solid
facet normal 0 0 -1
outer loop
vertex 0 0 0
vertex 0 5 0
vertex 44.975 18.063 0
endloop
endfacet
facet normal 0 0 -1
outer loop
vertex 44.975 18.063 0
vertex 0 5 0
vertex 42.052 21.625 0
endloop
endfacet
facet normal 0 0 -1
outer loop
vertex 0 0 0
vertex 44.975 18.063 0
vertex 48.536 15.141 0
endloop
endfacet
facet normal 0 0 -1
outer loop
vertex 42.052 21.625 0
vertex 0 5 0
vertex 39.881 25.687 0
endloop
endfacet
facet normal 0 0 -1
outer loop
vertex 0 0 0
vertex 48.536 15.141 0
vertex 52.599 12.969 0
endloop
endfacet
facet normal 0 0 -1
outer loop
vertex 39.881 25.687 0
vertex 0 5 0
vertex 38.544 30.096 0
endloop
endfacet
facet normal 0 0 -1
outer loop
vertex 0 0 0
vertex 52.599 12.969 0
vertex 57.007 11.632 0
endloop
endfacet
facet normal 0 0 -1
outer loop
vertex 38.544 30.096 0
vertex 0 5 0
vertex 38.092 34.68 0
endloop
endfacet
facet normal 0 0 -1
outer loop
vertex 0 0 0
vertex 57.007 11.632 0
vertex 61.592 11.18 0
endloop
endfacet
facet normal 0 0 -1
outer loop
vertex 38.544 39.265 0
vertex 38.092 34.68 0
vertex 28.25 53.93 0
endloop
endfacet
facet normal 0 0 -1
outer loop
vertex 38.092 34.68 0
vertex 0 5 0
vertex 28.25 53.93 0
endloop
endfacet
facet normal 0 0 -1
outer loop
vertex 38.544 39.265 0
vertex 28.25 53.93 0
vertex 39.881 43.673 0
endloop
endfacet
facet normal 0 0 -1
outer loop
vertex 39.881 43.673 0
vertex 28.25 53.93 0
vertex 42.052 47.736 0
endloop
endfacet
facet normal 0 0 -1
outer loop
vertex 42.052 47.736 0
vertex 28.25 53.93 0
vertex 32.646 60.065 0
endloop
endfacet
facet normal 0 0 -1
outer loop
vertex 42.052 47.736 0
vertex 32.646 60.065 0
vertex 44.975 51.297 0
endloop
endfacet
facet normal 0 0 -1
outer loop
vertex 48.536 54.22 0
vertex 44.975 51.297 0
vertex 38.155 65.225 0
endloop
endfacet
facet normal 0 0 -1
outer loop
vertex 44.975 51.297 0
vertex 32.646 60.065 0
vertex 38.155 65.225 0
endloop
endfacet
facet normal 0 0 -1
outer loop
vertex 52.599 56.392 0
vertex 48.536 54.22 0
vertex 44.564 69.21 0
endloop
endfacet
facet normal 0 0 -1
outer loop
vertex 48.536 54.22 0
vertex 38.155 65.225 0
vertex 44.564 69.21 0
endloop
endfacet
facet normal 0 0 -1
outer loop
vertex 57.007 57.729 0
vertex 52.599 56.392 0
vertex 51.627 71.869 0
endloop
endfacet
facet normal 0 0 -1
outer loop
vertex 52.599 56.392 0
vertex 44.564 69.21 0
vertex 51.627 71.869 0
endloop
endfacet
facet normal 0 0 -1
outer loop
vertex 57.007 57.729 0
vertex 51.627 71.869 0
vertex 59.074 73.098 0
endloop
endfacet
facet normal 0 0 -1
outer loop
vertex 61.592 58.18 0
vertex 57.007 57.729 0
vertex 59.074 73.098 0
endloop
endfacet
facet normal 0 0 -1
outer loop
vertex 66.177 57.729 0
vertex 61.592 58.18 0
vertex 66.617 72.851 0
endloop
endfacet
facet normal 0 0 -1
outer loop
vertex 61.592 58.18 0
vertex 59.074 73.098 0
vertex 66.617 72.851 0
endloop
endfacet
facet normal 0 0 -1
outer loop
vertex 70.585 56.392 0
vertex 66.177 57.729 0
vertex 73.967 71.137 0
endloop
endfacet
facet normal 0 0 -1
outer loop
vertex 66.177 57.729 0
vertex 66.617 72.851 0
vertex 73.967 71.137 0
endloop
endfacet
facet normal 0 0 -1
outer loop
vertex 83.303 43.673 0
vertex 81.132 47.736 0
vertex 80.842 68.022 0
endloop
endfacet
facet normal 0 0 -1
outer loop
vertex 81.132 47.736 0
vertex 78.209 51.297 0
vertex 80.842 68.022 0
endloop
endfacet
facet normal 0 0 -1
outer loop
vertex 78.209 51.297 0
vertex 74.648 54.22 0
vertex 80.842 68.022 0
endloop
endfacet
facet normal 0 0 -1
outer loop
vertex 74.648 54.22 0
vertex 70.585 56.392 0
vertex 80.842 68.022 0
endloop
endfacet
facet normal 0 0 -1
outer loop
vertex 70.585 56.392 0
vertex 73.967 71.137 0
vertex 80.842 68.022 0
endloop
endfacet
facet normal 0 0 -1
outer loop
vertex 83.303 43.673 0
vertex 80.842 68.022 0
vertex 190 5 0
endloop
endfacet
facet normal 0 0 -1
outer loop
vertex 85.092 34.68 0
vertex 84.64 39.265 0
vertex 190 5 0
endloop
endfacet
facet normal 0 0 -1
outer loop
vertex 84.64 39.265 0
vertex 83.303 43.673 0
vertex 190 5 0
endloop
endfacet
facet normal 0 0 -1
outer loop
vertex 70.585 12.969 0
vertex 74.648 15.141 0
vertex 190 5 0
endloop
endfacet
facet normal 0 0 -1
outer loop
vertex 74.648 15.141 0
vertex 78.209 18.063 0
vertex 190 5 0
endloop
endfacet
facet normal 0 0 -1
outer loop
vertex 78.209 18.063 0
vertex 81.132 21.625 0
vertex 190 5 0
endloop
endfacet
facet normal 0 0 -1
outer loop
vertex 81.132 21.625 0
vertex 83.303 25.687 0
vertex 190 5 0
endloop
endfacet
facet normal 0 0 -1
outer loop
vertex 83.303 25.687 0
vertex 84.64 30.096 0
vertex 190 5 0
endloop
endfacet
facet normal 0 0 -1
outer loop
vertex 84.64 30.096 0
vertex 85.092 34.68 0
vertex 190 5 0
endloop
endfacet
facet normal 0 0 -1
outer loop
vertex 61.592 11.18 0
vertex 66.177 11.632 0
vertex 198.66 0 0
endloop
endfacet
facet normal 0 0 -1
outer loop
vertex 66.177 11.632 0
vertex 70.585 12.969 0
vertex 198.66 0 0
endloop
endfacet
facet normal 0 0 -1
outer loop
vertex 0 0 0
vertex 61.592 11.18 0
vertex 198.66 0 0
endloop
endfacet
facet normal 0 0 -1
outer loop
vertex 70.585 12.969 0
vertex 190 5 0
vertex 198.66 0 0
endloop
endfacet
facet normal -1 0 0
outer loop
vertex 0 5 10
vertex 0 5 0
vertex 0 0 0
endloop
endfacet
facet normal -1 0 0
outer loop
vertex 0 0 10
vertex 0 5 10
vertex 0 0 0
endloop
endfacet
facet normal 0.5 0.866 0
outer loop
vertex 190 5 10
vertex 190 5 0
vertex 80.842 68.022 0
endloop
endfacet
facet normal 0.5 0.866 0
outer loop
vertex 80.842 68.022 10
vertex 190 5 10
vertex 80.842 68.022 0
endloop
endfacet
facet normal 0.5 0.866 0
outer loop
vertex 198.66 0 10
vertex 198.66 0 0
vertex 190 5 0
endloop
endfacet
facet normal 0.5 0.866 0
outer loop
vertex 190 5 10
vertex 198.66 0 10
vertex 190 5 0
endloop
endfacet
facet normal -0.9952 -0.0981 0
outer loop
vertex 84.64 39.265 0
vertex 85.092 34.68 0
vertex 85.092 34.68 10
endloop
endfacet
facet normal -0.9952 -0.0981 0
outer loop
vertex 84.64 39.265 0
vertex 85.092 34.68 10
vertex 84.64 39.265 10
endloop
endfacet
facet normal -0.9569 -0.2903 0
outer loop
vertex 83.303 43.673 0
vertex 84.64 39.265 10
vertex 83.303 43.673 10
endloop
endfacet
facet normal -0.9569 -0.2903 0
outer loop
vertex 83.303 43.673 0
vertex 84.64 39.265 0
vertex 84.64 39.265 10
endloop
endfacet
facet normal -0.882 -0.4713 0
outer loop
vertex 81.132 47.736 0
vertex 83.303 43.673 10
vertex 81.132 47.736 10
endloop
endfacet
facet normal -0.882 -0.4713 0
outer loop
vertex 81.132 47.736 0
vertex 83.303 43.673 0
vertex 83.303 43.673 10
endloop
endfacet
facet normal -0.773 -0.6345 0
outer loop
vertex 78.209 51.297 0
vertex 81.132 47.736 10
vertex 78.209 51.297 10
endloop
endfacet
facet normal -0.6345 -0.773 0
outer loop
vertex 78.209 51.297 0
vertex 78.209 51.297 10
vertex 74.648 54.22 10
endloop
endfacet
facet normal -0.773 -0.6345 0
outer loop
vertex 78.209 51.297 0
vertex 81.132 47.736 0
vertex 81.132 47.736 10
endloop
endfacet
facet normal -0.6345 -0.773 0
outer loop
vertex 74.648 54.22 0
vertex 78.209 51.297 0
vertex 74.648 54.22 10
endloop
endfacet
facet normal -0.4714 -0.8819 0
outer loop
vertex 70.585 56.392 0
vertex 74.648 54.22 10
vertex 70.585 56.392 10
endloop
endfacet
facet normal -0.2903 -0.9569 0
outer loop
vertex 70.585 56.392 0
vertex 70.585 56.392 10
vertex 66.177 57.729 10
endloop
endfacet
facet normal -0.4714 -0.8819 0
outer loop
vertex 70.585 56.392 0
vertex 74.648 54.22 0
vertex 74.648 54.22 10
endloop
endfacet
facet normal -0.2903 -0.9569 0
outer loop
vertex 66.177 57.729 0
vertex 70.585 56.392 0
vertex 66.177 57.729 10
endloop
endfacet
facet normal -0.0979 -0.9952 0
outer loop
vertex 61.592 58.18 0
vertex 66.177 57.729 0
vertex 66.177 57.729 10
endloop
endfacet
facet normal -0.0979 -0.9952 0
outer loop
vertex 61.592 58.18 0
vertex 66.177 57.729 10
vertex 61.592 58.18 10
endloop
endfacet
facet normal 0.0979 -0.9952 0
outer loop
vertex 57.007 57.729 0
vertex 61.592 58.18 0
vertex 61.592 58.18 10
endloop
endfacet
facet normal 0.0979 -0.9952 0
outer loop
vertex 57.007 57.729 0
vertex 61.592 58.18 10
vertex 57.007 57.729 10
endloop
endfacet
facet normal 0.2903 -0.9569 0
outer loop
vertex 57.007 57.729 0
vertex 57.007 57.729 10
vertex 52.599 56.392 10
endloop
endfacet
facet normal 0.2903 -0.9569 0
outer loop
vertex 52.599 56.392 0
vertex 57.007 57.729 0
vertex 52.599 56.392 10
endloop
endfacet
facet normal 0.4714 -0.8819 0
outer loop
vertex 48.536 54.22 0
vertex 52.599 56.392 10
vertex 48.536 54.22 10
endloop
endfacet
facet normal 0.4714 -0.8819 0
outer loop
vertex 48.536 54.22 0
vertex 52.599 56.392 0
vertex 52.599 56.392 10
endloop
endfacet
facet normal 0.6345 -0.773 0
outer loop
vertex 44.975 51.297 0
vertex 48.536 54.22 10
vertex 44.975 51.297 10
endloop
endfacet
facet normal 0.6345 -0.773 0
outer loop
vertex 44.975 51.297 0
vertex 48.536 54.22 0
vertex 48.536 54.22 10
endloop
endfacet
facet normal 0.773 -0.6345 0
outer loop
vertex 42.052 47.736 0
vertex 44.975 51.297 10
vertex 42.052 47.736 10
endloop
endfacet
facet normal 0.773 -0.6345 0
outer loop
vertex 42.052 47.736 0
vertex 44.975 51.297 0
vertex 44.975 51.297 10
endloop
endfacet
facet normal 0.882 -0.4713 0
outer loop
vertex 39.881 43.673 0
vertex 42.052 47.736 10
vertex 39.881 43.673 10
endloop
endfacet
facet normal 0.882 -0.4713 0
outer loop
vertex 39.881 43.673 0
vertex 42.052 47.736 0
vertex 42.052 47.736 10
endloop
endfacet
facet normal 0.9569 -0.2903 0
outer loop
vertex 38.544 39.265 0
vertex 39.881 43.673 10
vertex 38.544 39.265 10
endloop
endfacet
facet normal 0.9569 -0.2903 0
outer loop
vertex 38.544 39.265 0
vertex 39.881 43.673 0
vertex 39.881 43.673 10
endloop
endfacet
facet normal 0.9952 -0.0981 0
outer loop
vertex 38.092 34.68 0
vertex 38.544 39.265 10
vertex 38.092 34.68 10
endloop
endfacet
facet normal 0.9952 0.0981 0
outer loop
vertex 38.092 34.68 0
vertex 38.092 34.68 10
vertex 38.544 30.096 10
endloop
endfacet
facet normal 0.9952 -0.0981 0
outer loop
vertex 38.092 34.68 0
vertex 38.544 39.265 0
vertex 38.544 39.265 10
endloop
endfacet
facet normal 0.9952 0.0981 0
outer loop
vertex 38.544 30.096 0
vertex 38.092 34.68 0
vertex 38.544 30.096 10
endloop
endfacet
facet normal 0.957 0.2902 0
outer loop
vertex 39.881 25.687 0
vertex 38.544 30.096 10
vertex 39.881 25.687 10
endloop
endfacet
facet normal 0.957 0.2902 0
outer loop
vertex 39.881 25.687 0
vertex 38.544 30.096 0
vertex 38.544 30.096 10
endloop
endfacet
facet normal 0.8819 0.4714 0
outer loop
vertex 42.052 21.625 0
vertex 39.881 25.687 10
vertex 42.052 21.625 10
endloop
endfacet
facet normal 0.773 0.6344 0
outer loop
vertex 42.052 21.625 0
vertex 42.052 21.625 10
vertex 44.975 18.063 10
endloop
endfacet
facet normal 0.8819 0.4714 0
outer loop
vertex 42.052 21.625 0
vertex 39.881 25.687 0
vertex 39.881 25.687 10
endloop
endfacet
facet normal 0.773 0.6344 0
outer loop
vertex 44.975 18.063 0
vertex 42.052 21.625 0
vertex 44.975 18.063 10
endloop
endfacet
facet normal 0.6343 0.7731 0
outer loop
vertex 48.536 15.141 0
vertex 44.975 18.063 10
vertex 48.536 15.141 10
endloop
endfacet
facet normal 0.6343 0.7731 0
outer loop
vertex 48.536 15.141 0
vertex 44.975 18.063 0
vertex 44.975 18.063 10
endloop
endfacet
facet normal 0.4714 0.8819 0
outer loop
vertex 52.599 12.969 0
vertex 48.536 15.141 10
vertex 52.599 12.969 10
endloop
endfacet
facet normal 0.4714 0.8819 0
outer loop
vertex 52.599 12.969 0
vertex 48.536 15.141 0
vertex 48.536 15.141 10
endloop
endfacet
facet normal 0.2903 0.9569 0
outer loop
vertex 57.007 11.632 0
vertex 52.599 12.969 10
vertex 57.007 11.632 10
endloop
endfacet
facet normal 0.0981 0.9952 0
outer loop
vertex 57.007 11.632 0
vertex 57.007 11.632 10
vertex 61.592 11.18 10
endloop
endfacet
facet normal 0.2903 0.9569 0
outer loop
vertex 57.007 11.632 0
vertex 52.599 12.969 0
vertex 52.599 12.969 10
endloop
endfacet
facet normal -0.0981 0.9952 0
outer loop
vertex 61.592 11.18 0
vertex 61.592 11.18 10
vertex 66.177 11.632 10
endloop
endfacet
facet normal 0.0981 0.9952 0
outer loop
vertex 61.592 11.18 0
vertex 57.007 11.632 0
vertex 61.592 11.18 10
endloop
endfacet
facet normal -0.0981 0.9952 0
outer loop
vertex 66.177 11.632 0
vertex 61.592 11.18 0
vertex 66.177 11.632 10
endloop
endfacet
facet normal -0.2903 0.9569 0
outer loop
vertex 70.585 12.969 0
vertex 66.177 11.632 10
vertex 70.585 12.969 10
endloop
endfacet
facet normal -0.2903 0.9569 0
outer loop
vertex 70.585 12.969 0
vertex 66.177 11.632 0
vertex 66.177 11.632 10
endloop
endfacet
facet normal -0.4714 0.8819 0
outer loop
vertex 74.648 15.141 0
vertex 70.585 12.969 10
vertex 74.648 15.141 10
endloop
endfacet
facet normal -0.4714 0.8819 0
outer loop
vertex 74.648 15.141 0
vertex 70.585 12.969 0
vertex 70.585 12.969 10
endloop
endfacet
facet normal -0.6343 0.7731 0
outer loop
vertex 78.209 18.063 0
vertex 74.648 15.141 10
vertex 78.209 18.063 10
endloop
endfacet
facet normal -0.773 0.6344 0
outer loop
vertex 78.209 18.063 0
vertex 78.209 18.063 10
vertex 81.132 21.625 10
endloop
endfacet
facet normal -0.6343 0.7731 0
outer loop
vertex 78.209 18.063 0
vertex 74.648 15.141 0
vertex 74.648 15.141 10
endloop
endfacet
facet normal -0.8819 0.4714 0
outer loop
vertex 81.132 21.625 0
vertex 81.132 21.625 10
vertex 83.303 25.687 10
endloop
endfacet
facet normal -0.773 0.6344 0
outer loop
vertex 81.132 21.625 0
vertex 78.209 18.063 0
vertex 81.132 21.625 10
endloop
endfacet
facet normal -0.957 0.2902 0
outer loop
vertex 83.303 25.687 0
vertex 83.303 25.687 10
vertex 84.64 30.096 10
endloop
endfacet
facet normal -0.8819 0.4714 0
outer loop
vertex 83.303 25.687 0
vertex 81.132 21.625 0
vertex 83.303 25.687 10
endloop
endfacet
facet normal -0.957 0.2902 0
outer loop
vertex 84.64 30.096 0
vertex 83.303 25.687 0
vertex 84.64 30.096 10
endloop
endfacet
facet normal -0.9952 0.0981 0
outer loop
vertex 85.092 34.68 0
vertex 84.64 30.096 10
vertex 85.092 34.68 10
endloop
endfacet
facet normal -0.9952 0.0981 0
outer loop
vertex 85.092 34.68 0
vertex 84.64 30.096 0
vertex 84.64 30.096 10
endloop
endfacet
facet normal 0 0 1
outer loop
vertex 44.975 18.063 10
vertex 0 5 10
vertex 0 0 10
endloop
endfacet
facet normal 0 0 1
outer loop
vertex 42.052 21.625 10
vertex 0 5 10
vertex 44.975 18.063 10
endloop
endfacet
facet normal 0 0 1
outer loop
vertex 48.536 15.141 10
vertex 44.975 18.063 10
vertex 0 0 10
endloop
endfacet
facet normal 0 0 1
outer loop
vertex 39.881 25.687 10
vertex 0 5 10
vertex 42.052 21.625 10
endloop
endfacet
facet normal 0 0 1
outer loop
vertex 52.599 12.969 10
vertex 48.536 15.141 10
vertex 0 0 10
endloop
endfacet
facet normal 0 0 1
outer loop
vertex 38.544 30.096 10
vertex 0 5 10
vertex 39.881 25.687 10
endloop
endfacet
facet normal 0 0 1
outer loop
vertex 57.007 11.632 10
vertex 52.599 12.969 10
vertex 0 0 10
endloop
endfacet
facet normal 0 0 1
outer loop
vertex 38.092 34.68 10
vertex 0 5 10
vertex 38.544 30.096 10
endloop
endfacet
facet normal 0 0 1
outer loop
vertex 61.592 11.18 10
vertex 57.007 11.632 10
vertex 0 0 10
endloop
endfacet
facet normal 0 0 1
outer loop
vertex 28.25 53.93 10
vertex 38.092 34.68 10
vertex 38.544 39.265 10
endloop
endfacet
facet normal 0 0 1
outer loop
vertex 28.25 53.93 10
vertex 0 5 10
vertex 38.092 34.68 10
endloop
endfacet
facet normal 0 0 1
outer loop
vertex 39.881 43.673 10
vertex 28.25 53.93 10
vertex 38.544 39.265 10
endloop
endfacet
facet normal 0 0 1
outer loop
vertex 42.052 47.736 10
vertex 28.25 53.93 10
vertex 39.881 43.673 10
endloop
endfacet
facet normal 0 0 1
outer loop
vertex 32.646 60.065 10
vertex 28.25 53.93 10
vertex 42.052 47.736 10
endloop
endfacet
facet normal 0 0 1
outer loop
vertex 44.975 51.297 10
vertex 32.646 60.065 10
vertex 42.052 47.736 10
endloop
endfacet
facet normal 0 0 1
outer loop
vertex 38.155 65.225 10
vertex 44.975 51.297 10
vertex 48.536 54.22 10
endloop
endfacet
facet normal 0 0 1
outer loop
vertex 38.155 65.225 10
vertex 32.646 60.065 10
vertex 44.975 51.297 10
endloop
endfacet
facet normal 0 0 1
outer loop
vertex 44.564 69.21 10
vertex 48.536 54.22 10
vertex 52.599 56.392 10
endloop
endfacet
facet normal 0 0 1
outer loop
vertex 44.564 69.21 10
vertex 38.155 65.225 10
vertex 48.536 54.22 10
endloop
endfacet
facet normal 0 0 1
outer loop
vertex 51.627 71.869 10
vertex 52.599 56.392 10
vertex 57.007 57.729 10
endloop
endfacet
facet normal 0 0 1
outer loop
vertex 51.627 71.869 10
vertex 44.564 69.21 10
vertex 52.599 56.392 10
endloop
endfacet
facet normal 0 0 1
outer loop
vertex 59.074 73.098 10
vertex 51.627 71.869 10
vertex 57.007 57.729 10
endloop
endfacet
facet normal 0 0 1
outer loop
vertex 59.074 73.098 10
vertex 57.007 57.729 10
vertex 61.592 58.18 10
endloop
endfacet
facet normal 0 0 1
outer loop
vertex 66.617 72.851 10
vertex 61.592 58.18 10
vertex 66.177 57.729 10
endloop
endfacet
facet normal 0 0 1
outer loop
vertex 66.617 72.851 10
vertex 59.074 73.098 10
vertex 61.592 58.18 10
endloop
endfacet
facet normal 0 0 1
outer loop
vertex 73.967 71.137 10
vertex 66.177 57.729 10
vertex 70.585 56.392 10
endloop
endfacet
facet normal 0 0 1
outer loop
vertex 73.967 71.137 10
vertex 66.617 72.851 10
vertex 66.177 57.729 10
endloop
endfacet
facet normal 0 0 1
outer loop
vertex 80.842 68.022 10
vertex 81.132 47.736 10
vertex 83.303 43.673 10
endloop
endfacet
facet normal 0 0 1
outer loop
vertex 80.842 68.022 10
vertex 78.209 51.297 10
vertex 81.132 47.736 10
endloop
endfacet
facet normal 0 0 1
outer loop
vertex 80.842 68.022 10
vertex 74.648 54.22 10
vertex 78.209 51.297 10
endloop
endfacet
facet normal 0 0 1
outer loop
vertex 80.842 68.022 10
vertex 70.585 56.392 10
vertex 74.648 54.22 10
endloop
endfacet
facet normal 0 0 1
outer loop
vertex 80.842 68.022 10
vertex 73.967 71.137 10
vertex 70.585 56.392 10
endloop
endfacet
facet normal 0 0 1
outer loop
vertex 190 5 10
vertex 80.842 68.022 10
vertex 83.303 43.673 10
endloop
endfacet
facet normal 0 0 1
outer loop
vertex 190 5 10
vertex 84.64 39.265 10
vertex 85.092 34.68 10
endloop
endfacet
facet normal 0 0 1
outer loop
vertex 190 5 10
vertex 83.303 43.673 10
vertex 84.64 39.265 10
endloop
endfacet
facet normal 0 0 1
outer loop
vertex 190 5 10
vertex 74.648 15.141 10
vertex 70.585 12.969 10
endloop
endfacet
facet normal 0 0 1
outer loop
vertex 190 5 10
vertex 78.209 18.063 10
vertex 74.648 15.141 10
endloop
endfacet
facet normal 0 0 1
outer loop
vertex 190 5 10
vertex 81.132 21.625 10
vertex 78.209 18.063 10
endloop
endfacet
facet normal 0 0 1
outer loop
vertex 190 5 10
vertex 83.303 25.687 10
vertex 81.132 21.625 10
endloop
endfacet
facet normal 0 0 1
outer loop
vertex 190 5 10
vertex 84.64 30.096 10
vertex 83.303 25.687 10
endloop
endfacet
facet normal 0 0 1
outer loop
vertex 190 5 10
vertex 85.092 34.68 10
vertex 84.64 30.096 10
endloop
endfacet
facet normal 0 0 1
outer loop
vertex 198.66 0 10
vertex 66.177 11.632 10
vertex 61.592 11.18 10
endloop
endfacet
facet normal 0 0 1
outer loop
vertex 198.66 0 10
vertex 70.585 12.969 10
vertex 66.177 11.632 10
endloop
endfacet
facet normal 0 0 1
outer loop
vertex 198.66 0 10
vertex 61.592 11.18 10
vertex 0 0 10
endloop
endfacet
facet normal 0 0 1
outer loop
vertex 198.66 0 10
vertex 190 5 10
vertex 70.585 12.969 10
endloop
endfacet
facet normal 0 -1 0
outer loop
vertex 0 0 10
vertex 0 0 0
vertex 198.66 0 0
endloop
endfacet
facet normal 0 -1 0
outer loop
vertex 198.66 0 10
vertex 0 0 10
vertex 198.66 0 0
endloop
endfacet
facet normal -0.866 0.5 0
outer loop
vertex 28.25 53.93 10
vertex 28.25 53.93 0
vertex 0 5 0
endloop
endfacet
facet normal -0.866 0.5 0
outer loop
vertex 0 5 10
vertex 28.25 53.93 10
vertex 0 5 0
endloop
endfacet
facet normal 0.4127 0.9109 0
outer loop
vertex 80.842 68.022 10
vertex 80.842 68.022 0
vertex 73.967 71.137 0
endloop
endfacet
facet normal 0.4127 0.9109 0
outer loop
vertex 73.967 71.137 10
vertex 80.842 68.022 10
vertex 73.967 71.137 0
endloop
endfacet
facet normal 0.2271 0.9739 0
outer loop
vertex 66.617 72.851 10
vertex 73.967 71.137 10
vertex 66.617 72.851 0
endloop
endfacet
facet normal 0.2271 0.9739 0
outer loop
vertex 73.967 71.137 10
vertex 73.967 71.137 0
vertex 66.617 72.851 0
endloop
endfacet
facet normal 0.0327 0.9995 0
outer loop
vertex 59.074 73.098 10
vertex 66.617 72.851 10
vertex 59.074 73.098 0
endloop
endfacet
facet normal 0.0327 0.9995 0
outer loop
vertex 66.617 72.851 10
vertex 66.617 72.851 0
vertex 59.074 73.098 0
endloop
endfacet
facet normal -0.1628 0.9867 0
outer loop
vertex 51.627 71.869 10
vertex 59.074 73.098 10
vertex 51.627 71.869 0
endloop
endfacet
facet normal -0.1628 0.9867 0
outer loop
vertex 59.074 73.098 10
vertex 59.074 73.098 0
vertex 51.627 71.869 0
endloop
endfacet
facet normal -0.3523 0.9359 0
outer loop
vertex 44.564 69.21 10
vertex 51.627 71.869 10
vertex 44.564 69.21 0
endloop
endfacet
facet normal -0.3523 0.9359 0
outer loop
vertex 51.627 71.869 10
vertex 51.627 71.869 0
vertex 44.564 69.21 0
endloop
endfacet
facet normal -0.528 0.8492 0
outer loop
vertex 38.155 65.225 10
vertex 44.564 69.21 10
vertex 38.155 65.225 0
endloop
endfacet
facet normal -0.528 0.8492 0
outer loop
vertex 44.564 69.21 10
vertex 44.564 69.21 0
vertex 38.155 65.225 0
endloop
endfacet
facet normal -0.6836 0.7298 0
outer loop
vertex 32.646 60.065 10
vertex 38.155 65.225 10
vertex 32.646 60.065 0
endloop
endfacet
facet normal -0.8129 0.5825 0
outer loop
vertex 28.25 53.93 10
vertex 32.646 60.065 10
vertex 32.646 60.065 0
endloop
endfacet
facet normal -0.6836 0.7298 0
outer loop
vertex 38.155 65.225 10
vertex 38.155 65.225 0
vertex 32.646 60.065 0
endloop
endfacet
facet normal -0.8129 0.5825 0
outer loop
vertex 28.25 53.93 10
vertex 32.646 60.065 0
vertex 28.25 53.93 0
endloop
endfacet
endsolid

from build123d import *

# Parameters (mm, degrees)
ESQUISSE1_R        = 23.5
BOSS_EXTRU_1_DEPTH = 10


with BuildPart() as part:
    # Esquisse1 → Boss.-Extru.1 (new body)
    with BuildSketch(Plane.XY):
        with BuildLine():
            Line((0, 0), (190, 0))
            Line((190, 0), (198.660254038, 0))
            Line((198.660254038, 0), (190, 5))
            Line((190, 5), (80.841978046, 68.02241336))
            ThreePointArc((80.841978046, 68.02241336), (51.627444809, 71.868579626), (28.25, 53.930435314))
            Line((28.25, 53.930435314), (0, 5))
            Line((0, 5), (0, 0))
        make_face()
        with Locations((61.591978046, 34.680435314)):
            Circle(ESQUISSE1_R, mode=Mode.SUBTRACT)
    extrude(amount=BOSS_EXTRU_1_DEPTH)


solid = part.part
